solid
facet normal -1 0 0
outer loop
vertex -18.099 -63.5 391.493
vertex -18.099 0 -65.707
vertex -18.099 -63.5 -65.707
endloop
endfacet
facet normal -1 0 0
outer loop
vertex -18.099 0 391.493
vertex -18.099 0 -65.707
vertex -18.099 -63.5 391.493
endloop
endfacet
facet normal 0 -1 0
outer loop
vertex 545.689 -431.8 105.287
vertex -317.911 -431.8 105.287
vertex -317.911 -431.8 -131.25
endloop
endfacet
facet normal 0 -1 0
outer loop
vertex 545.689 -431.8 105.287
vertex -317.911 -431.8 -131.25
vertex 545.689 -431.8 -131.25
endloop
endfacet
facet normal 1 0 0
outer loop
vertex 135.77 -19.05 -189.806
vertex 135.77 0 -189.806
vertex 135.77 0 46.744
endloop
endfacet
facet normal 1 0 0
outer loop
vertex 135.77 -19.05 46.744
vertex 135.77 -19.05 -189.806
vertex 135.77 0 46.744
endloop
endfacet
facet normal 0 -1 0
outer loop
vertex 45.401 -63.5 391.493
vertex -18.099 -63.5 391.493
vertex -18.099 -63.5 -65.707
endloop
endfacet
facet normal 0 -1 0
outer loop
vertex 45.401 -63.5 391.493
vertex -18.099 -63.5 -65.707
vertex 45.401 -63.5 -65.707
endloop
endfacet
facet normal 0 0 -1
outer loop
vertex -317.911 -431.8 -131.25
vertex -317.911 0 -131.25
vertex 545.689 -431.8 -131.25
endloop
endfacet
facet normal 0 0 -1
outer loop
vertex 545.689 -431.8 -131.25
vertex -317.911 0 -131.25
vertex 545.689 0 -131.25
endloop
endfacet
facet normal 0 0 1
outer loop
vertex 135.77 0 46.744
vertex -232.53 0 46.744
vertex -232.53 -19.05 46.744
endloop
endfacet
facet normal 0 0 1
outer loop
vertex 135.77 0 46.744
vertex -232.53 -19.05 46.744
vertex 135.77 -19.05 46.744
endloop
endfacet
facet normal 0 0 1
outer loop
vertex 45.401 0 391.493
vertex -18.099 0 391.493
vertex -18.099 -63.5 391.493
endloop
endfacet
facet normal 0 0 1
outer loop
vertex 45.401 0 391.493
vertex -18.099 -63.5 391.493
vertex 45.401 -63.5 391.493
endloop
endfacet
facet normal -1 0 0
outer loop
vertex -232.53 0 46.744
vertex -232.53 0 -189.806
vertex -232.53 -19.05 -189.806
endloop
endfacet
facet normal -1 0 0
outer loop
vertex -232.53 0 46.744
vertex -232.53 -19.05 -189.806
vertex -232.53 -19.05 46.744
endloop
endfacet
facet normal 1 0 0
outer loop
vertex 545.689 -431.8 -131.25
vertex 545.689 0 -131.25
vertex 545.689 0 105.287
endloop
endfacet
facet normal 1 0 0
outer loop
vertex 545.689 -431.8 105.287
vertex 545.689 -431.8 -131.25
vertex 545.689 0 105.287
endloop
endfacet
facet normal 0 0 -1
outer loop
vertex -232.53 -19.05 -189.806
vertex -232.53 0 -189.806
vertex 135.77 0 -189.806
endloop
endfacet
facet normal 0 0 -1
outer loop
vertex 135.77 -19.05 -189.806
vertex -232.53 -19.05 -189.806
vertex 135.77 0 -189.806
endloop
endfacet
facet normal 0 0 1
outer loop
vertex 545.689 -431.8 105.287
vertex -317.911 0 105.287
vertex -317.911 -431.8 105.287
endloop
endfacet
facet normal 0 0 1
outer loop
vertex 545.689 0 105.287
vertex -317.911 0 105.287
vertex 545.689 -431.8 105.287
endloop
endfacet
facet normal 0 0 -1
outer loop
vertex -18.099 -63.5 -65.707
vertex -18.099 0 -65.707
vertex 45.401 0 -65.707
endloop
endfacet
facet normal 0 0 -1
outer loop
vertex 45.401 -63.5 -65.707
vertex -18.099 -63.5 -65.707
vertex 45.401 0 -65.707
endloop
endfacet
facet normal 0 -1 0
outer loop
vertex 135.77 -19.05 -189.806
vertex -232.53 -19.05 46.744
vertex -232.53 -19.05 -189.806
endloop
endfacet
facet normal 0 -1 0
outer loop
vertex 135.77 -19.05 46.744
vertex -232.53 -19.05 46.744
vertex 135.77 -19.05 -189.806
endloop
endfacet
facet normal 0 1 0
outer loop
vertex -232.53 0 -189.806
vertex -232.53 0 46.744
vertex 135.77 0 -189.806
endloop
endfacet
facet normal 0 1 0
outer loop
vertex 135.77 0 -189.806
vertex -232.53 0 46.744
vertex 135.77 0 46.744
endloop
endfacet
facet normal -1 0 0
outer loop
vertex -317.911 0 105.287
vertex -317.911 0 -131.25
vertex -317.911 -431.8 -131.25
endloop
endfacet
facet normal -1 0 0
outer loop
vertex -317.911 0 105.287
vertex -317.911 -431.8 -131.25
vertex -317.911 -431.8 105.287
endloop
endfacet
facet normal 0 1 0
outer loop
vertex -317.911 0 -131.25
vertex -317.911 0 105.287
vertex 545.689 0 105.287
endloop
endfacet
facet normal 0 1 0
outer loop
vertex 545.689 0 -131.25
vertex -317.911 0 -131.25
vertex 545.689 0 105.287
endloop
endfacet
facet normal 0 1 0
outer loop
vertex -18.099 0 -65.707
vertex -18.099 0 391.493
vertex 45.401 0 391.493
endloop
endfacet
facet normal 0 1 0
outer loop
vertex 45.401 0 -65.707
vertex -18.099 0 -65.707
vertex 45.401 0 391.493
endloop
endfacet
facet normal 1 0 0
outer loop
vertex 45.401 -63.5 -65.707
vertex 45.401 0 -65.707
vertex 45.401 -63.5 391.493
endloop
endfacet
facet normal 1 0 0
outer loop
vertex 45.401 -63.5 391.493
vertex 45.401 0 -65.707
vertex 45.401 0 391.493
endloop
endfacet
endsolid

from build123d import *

# Parameters (mm, degrees)
F0_W     = 63.5
F0_H     = 457.2
F1_DEPTH = 63.5
F2_W     = 863.6
F2_H     = 236.5375
F3_DEPTH = 431.8
F4_W     = 368.3
F4_H     = 236.5502
F5_DEPTH = 19.05


with BuildPart() as f1:
    # F0 (on Front) → F1 (new body)
    with BuildSketch(Plane.XZ):
        with Locations((13.651035, 162.892898)):
            Rectangle(F0_W, F0_H)
    extrude(amount=F1_DEPTH)


with BuildPart() as f3:
    # F2 (on Front) → F3 (new body)
    with BuildSketch(Plane.XZ):
        with Locations((113.889453, -12.981334)):
            Rectangle(F2_W, F2_H)
    extrude(amount=F3_DEPTH)


with BuildPart() as f5:
    # F4 (on face) → F5 (new body)
    with BuildSketch(Plane.XZ):
        with Locations((-48.380244, -71.531262)):
            Rectangle(F4_W, F4_H)
    extrude(amount=F5_DEPTH)


solid = Compound([f1.part, f3.part, f5.part])
